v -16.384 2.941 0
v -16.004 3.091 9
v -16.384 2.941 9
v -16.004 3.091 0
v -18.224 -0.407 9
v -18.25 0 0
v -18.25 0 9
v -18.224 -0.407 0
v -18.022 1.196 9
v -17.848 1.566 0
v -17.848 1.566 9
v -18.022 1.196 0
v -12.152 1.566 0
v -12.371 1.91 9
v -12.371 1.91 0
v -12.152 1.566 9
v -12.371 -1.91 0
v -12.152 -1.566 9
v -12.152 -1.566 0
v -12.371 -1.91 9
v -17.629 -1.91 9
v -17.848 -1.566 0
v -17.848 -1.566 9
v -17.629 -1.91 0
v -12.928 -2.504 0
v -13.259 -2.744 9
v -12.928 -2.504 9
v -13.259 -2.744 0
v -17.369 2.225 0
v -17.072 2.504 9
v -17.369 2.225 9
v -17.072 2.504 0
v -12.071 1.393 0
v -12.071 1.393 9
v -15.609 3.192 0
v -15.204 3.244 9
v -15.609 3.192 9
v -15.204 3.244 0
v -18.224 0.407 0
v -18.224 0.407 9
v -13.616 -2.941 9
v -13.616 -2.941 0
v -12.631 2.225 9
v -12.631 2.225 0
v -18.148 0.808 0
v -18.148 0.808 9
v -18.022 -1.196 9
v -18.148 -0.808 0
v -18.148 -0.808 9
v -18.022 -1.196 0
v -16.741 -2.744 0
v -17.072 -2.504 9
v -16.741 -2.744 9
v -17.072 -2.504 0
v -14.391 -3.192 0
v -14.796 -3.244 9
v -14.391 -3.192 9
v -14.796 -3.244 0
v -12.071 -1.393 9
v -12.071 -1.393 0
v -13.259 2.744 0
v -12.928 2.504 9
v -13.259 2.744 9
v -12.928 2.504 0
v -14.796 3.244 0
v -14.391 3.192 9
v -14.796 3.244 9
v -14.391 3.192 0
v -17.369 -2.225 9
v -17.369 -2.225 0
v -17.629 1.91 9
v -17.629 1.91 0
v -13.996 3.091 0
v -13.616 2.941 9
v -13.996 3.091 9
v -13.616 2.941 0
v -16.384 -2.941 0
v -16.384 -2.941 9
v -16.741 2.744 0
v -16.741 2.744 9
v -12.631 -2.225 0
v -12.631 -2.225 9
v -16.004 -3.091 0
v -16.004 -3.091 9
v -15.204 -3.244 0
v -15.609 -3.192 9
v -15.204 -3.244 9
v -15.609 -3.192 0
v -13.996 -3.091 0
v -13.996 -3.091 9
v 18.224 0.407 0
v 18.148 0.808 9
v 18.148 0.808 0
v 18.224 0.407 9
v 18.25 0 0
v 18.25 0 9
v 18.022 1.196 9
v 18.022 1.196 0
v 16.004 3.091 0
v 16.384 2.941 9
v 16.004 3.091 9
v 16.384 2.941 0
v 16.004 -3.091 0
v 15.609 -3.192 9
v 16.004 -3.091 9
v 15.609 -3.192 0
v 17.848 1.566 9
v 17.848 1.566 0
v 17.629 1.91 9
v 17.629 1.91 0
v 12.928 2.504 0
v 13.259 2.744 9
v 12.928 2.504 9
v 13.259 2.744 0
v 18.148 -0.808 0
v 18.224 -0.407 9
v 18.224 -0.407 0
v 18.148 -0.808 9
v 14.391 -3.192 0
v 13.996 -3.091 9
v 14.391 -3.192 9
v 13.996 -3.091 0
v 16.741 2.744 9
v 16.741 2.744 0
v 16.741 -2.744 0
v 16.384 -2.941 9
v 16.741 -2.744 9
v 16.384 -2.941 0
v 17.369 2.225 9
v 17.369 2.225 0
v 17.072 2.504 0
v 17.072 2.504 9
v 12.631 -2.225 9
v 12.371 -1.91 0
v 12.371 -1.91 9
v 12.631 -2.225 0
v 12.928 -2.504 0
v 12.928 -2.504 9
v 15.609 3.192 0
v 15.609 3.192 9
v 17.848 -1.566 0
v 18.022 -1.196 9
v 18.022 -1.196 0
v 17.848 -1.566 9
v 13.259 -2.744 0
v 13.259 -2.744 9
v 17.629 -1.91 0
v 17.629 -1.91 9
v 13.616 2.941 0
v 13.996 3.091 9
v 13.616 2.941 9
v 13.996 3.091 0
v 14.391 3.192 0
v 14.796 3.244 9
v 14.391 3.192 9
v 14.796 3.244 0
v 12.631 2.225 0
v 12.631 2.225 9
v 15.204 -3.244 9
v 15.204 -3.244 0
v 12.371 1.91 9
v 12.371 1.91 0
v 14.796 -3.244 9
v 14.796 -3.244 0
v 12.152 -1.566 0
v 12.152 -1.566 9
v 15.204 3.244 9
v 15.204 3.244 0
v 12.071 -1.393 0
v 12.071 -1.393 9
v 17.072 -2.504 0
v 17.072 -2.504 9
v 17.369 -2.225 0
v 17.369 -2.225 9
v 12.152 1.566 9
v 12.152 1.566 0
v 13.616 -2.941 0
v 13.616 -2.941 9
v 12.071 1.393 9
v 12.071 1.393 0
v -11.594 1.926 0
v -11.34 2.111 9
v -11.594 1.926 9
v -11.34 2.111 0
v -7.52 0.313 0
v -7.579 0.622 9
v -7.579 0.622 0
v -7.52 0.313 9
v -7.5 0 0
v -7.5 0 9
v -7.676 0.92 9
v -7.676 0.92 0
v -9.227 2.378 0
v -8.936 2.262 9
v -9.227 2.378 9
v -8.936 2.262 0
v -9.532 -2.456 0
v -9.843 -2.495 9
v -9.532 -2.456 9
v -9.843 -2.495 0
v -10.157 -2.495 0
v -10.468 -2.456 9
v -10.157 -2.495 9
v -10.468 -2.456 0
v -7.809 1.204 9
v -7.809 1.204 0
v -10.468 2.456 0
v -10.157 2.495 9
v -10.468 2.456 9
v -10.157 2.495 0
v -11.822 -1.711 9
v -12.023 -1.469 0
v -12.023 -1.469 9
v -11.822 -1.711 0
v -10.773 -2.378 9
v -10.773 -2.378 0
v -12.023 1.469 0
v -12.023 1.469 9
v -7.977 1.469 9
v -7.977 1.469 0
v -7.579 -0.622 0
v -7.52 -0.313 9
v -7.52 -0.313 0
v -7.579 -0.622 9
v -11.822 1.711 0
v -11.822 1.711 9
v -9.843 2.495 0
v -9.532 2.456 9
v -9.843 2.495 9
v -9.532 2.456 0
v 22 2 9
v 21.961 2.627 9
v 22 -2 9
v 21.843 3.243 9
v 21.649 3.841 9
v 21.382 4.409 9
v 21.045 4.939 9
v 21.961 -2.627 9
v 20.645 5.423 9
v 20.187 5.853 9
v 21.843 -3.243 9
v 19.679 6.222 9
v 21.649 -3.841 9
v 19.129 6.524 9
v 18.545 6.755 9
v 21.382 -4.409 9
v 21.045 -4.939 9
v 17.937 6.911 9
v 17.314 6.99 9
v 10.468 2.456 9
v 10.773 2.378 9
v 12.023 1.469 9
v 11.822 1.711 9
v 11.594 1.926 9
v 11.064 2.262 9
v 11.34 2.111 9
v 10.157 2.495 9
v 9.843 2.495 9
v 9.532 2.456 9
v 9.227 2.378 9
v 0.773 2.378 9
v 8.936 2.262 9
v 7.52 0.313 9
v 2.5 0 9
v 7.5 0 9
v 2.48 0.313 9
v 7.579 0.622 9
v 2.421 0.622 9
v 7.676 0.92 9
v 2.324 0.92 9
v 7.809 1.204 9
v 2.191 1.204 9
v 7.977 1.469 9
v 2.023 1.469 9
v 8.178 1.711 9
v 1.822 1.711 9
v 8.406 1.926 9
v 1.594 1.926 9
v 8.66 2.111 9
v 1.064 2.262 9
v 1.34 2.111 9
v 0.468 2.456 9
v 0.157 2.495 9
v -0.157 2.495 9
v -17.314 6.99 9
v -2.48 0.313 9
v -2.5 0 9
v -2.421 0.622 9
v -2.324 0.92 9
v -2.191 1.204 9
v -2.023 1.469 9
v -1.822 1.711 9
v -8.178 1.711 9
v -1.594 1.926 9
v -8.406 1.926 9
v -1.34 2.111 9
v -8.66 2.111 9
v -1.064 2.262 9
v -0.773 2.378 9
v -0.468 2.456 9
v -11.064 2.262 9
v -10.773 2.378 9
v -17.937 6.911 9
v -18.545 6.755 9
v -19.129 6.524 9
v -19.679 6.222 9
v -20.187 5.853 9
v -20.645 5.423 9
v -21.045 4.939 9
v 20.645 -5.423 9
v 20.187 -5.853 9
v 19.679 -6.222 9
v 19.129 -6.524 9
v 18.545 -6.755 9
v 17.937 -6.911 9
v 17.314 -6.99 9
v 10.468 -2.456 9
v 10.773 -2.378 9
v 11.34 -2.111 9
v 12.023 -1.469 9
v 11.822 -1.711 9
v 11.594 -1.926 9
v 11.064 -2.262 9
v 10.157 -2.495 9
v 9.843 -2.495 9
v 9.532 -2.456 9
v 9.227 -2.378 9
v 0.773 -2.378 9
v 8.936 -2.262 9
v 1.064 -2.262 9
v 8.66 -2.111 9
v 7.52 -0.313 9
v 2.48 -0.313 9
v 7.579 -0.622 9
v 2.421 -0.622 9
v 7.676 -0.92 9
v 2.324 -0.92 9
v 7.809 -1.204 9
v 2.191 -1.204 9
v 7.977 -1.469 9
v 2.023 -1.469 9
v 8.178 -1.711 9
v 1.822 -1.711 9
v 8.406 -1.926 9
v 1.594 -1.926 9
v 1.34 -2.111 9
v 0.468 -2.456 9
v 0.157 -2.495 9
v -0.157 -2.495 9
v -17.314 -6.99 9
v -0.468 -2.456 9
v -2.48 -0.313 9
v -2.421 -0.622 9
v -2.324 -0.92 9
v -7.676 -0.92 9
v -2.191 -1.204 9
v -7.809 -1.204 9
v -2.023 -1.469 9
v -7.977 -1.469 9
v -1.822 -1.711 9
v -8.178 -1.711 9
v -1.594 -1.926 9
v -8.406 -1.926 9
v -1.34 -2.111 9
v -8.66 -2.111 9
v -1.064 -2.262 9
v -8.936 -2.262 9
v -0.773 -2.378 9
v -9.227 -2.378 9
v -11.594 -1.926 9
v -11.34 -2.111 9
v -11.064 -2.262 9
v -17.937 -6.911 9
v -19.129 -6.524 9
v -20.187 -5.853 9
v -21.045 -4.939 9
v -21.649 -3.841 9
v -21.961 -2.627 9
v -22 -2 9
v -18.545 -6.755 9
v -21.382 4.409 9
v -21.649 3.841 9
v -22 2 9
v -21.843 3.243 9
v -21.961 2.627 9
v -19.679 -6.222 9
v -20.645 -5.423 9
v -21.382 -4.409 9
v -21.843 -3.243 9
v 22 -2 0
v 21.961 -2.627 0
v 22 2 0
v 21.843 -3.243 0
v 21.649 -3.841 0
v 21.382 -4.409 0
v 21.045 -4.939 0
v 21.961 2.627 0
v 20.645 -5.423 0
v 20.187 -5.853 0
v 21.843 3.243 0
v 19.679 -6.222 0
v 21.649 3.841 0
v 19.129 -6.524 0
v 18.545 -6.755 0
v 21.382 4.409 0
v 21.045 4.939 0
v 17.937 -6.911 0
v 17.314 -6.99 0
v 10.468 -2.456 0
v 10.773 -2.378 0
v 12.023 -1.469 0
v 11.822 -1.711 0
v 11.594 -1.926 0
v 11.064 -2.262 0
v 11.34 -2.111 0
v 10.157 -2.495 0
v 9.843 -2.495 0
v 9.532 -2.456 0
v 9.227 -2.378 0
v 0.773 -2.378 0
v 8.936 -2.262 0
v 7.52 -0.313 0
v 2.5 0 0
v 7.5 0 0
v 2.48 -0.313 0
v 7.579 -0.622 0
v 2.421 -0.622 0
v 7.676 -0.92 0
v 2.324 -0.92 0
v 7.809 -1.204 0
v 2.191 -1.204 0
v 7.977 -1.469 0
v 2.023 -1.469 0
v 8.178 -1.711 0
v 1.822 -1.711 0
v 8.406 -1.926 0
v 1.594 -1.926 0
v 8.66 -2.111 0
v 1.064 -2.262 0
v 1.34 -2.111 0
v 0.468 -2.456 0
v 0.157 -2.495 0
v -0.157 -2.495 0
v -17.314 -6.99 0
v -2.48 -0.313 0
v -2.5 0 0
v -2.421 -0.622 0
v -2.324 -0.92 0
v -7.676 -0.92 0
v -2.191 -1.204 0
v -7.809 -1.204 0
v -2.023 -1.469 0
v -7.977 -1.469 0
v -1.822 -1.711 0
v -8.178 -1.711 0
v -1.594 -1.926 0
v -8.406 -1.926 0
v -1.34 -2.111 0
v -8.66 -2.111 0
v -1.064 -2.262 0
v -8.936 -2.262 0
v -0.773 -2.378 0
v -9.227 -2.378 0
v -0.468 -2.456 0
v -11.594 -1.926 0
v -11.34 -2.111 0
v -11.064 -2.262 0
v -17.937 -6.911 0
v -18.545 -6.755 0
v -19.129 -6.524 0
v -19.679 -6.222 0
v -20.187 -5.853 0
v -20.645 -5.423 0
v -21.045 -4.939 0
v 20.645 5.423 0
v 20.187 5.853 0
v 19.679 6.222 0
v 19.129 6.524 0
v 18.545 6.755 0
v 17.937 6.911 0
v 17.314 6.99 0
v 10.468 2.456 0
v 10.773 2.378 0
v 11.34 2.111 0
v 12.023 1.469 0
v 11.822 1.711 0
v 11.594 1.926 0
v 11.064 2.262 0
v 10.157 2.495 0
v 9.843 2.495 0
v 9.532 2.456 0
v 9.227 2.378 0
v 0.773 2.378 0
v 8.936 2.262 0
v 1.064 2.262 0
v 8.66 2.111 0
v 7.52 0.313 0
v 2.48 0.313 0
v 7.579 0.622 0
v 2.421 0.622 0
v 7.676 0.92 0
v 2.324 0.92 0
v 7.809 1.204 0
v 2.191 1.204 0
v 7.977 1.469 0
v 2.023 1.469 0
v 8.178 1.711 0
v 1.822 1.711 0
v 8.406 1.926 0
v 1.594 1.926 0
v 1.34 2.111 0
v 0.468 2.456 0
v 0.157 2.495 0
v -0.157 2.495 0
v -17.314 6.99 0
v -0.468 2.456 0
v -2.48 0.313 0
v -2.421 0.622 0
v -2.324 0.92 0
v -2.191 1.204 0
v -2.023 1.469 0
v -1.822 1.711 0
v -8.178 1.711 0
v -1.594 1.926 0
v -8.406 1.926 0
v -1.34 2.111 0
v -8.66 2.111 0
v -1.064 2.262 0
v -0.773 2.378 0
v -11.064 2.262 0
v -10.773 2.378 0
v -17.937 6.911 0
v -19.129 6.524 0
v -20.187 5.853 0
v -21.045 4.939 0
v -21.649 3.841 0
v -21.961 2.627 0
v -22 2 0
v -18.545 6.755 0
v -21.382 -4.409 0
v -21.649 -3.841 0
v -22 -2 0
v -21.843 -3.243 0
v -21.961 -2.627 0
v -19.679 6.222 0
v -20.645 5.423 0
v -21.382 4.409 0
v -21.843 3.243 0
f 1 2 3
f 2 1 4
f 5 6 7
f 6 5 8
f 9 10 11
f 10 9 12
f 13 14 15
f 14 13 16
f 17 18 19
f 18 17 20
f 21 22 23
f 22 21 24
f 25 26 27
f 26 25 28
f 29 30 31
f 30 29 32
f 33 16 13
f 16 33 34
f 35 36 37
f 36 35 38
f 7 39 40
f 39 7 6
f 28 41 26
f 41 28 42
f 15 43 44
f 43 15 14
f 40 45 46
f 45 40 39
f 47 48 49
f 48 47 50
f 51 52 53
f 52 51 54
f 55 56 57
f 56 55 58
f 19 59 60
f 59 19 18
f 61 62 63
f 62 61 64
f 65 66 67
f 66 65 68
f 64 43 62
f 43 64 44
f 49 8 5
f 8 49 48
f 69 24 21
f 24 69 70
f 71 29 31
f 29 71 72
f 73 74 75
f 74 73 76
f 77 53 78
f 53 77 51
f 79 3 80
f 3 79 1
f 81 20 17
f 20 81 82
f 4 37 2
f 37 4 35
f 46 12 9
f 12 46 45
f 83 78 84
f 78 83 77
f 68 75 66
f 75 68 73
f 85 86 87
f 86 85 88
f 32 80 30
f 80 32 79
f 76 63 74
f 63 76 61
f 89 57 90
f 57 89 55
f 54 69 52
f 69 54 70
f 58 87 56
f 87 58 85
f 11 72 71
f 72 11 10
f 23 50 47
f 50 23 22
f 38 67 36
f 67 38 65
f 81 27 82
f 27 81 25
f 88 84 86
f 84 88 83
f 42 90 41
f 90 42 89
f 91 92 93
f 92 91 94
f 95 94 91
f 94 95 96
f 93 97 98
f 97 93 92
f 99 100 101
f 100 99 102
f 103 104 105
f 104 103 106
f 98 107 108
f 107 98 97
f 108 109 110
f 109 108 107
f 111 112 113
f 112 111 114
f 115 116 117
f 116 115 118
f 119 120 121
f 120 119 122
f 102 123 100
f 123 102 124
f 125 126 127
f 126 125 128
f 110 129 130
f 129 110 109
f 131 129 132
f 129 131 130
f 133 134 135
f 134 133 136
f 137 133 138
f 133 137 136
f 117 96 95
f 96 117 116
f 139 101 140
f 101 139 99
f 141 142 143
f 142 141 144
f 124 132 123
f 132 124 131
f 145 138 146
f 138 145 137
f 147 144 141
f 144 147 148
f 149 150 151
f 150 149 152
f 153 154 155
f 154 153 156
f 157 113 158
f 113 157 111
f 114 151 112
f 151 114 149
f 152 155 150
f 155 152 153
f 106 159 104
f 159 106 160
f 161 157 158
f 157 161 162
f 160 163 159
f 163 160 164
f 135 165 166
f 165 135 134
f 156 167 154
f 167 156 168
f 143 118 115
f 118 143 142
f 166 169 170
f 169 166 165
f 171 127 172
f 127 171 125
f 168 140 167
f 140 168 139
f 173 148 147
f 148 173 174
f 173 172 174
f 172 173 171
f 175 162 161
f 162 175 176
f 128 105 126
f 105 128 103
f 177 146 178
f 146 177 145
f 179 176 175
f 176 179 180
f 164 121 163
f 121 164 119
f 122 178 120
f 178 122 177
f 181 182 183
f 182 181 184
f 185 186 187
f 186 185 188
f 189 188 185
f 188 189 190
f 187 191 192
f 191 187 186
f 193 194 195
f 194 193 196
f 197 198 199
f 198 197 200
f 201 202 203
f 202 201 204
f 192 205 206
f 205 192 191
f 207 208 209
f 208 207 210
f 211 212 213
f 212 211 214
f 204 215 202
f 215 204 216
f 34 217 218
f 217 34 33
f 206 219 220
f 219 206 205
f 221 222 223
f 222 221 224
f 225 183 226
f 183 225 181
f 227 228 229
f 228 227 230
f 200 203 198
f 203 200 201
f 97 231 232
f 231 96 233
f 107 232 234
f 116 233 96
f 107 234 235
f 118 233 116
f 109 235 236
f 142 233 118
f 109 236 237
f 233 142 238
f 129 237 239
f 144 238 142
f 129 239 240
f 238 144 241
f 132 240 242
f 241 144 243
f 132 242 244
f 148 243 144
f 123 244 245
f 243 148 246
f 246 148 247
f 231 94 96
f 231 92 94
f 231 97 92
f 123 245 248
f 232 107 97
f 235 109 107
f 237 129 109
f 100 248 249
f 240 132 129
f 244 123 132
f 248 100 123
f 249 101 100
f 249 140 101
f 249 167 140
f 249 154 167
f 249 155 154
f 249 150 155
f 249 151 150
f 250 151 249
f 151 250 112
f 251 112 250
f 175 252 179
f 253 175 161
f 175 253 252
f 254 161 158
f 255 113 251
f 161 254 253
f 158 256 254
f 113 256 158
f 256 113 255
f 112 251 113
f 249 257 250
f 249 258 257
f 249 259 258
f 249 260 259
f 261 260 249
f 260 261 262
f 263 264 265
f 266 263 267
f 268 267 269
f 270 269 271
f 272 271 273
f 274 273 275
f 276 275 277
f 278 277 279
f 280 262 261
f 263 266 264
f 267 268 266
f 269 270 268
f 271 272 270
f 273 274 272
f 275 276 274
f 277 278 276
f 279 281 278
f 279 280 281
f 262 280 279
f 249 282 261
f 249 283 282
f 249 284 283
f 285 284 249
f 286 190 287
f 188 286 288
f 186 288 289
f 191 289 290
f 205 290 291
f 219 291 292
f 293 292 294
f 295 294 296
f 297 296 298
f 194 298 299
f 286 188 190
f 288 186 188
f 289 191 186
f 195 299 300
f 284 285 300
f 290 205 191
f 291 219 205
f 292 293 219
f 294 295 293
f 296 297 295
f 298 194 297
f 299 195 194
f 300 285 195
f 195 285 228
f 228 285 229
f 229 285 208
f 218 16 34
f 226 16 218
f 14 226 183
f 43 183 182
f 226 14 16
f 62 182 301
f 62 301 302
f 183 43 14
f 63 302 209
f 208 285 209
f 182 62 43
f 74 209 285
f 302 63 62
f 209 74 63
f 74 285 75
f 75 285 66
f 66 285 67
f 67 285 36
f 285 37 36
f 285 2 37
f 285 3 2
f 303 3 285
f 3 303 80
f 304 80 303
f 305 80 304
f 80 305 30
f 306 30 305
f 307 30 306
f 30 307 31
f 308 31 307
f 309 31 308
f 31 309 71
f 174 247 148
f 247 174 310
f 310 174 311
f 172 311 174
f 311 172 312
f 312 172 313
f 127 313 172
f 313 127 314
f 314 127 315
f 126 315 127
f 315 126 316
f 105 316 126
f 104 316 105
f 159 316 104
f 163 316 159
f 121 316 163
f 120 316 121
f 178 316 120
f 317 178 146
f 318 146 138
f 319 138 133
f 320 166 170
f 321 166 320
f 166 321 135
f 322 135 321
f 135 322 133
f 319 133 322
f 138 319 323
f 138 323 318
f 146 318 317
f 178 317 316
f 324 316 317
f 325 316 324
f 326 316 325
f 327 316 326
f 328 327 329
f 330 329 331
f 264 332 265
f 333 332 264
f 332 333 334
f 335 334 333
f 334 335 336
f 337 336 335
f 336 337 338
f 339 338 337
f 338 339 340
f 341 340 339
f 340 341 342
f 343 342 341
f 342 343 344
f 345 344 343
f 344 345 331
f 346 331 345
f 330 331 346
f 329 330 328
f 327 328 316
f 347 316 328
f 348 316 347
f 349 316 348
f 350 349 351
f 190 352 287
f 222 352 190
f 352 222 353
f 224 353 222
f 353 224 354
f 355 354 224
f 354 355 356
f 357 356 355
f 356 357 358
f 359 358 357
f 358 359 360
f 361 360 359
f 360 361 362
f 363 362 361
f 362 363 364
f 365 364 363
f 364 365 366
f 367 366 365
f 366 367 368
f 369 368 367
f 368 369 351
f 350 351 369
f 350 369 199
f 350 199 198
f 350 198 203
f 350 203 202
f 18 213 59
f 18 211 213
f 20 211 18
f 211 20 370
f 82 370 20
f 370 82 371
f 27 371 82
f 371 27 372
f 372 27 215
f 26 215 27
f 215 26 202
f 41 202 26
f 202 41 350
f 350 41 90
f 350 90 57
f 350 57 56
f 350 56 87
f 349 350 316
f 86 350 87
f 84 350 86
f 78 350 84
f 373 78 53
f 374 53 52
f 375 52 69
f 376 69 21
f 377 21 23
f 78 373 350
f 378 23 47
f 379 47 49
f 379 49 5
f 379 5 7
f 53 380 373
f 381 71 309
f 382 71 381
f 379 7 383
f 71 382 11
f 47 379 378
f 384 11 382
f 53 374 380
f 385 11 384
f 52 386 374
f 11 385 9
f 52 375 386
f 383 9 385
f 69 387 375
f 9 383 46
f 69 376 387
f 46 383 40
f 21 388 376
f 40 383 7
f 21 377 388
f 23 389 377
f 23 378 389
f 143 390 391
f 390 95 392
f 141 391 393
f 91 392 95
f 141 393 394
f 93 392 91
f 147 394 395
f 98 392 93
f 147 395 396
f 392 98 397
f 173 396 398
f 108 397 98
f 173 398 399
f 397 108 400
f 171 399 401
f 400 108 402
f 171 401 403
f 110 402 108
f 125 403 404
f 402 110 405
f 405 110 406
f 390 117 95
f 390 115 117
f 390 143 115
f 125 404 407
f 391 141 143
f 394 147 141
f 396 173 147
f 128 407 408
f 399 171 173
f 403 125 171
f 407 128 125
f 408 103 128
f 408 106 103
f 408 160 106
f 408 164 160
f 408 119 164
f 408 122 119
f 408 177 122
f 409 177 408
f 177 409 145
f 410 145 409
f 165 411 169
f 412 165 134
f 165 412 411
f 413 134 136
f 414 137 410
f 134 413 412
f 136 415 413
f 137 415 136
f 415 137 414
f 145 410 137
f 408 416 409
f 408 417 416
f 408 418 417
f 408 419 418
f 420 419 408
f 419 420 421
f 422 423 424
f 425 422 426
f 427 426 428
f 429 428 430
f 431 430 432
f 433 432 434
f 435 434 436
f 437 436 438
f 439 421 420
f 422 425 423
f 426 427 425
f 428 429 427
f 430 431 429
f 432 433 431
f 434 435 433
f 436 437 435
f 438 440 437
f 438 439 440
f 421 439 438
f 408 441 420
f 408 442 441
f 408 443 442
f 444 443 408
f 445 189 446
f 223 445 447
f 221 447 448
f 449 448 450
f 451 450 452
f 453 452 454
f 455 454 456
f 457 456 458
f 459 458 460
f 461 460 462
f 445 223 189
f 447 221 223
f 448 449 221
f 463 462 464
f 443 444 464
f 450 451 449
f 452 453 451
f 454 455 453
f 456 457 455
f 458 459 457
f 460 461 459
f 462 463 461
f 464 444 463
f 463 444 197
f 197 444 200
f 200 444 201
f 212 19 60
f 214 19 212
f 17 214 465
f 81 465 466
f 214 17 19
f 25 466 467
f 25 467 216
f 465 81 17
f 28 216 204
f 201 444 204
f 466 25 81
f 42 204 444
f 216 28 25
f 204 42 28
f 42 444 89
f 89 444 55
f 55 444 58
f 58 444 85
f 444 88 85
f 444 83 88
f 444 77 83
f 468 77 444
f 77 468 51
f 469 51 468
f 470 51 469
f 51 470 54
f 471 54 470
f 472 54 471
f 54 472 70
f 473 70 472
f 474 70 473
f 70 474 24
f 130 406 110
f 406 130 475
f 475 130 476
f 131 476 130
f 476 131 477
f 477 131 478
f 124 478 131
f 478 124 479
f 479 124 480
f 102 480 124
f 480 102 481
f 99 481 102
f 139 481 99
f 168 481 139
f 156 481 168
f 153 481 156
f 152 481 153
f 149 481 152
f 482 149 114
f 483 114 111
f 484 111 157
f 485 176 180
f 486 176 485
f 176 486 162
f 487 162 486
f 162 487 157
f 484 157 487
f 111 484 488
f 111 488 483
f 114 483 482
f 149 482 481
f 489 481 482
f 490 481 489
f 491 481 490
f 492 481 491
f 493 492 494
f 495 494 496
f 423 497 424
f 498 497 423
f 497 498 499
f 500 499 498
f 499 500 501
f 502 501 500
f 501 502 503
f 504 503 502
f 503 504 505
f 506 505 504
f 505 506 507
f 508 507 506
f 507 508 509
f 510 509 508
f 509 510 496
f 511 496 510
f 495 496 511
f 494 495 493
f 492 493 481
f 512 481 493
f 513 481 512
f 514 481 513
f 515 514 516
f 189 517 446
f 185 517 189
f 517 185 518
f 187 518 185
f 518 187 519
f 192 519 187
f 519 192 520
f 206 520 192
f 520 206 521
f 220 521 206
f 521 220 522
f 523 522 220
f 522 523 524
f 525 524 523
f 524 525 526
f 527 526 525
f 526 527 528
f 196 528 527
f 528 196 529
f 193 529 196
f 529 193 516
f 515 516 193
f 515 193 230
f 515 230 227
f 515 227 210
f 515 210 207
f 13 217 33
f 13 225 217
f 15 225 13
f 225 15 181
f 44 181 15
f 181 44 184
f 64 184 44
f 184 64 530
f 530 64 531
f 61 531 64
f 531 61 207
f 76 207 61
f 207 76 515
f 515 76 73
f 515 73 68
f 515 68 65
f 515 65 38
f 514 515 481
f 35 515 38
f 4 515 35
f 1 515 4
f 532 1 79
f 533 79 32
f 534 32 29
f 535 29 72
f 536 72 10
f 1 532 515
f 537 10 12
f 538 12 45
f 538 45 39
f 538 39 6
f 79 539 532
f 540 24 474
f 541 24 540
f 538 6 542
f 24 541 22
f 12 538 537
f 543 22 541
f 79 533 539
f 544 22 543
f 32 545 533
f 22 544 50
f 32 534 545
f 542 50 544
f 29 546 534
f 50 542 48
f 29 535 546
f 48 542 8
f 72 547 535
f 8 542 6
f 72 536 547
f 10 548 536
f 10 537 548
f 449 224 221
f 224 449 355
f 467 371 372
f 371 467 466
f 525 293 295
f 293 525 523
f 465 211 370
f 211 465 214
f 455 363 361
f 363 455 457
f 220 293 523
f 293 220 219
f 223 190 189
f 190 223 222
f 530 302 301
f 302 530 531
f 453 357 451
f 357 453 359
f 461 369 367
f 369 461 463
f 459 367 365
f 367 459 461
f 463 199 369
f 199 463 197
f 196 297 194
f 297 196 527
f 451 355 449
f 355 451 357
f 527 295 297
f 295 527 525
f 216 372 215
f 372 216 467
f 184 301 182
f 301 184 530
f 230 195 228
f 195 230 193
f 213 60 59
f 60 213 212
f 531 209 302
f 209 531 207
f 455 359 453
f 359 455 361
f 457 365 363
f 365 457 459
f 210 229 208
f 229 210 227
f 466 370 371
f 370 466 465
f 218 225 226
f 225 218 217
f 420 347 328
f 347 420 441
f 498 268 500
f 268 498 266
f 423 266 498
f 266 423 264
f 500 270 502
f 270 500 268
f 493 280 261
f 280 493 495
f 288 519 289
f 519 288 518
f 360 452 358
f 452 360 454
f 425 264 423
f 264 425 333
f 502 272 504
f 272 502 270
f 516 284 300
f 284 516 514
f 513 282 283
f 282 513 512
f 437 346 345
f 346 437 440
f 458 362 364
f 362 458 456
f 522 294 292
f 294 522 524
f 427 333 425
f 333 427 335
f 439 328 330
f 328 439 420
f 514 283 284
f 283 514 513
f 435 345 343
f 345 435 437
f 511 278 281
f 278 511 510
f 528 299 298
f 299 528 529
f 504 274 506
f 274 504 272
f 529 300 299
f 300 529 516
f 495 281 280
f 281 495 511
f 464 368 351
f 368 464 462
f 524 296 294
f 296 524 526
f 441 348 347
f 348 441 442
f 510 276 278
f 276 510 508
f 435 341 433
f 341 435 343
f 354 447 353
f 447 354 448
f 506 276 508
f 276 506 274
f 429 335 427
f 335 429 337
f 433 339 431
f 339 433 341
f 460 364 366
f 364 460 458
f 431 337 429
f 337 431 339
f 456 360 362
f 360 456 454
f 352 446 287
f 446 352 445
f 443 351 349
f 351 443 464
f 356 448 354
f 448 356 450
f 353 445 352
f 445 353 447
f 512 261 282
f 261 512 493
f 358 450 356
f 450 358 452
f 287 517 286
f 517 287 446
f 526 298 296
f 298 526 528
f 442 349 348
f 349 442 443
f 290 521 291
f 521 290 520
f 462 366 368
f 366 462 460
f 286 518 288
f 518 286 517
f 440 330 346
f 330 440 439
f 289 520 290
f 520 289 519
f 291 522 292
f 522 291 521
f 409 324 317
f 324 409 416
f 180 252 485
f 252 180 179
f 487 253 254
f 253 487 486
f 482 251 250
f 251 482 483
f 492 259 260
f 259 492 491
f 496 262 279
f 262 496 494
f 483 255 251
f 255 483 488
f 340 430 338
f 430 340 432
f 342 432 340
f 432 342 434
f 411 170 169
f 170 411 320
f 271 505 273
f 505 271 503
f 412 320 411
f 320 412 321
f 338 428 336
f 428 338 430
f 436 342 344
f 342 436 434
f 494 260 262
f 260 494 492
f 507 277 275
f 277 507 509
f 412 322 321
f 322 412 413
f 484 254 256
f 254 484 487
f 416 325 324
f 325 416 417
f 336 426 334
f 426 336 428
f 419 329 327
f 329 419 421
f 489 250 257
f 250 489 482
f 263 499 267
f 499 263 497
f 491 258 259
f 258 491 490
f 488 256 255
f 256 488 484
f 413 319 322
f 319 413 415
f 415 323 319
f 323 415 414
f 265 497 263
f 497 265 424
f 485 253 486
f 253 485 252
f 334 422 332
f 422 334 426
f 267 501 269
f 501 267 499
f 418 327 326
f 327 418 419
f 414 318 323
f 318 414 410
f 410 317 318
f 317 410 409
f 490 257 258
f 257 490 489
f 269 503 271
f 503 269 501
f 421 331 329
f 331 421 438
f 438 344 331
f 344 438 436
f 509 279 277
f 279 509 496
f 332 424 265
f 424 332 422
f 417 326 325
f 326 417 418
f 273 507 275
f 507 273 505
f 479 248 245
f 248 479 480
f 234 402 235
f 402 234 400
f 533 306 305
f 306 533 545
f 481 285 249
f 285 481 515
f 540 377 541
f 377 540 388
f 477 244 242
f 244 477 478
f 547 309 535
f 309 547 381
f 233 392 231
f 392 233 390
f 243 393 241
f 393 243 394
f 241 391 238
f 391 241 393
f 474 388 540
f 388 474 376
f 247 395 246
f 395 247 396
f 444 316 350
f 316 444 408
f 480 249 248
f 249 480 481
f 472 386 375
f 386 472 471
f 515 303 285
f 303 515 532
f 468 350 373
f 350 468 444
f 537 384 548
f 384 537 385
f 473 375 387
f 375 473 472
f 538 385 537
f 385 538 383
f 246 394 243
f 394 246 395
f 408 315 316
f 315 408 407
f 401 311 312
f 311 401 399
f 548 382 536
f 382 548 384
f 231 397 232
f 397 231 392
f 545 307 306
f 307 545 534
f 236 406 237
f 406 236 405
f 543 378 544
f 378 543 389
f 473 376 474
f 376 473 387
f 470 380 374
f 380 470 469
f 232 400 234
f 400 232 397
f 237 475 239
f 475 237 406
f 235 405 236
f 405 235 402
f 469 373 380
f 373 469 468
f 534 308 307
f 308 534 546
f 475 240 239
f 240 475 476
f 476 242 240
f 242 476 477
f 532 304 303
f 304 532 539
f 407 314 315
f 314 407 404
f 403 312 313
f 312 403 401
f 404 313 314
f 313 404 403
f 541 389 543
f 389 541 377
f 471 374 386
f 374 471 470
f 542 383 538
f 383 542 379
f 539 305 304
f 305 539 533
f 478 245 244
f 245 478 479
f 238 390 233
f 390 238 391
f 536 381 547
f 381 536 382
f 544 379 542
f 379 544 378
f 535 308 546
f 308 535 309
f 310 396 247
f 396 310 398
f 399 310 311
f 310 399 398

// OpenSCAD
$fn = 50;


difference() {
	union() {
		hull() {
			translate(v = [-17.0000000000, 2.0000000000, 0]) {
				cylinder(h = 9, r = 5);
			}
			translate(v = [17.0000000000, 2.0000000000, 0]) {
				cylinder(h = 9, r = 5);
			}
			translate(v = [-17.0000000000, -2.0000000000, 0]) {
				cylinder(h = 9, r = 5);
			}
			translate(v = [17.0000000000, -2.0000000000, 0]) {
				cylinder(h = 9, r = 5);
			}
		}
	}
	union() {
		#translate(v = [-15.0000000000, 0.0000000000, -100.0000000000]) {
			cylinder(h = 200, r = 3.2500000000);
		}
		#translate(v = [-15.0000000000, 0.0000000000, -100.0000000000]) {
			cylinder(h = 200, r = 3.2500000000);
		}
		#translate(v = [15.0000000000, 0.0000000000, -100.0000000000]) {
			cylinder(h = 200, r = 3.2500000000);
		}
		#translate(v = [15.0000000000, 0.0000000000, -100.0000000000]) {
			cylinder(h = 200, r = 3.2500000000);
		}
		#translate(v = [-10.0000000000, 0, 0]) {
			cylinder(h = 9, r = 2.5000000000);
		}
		#cylinder(h = 9, r = 2.5000000000);
		#translate(v = [10.0000000000, 0, 0]) {
			cylinder(h = 9, r = 2.5000000000);
		}
	}
}
